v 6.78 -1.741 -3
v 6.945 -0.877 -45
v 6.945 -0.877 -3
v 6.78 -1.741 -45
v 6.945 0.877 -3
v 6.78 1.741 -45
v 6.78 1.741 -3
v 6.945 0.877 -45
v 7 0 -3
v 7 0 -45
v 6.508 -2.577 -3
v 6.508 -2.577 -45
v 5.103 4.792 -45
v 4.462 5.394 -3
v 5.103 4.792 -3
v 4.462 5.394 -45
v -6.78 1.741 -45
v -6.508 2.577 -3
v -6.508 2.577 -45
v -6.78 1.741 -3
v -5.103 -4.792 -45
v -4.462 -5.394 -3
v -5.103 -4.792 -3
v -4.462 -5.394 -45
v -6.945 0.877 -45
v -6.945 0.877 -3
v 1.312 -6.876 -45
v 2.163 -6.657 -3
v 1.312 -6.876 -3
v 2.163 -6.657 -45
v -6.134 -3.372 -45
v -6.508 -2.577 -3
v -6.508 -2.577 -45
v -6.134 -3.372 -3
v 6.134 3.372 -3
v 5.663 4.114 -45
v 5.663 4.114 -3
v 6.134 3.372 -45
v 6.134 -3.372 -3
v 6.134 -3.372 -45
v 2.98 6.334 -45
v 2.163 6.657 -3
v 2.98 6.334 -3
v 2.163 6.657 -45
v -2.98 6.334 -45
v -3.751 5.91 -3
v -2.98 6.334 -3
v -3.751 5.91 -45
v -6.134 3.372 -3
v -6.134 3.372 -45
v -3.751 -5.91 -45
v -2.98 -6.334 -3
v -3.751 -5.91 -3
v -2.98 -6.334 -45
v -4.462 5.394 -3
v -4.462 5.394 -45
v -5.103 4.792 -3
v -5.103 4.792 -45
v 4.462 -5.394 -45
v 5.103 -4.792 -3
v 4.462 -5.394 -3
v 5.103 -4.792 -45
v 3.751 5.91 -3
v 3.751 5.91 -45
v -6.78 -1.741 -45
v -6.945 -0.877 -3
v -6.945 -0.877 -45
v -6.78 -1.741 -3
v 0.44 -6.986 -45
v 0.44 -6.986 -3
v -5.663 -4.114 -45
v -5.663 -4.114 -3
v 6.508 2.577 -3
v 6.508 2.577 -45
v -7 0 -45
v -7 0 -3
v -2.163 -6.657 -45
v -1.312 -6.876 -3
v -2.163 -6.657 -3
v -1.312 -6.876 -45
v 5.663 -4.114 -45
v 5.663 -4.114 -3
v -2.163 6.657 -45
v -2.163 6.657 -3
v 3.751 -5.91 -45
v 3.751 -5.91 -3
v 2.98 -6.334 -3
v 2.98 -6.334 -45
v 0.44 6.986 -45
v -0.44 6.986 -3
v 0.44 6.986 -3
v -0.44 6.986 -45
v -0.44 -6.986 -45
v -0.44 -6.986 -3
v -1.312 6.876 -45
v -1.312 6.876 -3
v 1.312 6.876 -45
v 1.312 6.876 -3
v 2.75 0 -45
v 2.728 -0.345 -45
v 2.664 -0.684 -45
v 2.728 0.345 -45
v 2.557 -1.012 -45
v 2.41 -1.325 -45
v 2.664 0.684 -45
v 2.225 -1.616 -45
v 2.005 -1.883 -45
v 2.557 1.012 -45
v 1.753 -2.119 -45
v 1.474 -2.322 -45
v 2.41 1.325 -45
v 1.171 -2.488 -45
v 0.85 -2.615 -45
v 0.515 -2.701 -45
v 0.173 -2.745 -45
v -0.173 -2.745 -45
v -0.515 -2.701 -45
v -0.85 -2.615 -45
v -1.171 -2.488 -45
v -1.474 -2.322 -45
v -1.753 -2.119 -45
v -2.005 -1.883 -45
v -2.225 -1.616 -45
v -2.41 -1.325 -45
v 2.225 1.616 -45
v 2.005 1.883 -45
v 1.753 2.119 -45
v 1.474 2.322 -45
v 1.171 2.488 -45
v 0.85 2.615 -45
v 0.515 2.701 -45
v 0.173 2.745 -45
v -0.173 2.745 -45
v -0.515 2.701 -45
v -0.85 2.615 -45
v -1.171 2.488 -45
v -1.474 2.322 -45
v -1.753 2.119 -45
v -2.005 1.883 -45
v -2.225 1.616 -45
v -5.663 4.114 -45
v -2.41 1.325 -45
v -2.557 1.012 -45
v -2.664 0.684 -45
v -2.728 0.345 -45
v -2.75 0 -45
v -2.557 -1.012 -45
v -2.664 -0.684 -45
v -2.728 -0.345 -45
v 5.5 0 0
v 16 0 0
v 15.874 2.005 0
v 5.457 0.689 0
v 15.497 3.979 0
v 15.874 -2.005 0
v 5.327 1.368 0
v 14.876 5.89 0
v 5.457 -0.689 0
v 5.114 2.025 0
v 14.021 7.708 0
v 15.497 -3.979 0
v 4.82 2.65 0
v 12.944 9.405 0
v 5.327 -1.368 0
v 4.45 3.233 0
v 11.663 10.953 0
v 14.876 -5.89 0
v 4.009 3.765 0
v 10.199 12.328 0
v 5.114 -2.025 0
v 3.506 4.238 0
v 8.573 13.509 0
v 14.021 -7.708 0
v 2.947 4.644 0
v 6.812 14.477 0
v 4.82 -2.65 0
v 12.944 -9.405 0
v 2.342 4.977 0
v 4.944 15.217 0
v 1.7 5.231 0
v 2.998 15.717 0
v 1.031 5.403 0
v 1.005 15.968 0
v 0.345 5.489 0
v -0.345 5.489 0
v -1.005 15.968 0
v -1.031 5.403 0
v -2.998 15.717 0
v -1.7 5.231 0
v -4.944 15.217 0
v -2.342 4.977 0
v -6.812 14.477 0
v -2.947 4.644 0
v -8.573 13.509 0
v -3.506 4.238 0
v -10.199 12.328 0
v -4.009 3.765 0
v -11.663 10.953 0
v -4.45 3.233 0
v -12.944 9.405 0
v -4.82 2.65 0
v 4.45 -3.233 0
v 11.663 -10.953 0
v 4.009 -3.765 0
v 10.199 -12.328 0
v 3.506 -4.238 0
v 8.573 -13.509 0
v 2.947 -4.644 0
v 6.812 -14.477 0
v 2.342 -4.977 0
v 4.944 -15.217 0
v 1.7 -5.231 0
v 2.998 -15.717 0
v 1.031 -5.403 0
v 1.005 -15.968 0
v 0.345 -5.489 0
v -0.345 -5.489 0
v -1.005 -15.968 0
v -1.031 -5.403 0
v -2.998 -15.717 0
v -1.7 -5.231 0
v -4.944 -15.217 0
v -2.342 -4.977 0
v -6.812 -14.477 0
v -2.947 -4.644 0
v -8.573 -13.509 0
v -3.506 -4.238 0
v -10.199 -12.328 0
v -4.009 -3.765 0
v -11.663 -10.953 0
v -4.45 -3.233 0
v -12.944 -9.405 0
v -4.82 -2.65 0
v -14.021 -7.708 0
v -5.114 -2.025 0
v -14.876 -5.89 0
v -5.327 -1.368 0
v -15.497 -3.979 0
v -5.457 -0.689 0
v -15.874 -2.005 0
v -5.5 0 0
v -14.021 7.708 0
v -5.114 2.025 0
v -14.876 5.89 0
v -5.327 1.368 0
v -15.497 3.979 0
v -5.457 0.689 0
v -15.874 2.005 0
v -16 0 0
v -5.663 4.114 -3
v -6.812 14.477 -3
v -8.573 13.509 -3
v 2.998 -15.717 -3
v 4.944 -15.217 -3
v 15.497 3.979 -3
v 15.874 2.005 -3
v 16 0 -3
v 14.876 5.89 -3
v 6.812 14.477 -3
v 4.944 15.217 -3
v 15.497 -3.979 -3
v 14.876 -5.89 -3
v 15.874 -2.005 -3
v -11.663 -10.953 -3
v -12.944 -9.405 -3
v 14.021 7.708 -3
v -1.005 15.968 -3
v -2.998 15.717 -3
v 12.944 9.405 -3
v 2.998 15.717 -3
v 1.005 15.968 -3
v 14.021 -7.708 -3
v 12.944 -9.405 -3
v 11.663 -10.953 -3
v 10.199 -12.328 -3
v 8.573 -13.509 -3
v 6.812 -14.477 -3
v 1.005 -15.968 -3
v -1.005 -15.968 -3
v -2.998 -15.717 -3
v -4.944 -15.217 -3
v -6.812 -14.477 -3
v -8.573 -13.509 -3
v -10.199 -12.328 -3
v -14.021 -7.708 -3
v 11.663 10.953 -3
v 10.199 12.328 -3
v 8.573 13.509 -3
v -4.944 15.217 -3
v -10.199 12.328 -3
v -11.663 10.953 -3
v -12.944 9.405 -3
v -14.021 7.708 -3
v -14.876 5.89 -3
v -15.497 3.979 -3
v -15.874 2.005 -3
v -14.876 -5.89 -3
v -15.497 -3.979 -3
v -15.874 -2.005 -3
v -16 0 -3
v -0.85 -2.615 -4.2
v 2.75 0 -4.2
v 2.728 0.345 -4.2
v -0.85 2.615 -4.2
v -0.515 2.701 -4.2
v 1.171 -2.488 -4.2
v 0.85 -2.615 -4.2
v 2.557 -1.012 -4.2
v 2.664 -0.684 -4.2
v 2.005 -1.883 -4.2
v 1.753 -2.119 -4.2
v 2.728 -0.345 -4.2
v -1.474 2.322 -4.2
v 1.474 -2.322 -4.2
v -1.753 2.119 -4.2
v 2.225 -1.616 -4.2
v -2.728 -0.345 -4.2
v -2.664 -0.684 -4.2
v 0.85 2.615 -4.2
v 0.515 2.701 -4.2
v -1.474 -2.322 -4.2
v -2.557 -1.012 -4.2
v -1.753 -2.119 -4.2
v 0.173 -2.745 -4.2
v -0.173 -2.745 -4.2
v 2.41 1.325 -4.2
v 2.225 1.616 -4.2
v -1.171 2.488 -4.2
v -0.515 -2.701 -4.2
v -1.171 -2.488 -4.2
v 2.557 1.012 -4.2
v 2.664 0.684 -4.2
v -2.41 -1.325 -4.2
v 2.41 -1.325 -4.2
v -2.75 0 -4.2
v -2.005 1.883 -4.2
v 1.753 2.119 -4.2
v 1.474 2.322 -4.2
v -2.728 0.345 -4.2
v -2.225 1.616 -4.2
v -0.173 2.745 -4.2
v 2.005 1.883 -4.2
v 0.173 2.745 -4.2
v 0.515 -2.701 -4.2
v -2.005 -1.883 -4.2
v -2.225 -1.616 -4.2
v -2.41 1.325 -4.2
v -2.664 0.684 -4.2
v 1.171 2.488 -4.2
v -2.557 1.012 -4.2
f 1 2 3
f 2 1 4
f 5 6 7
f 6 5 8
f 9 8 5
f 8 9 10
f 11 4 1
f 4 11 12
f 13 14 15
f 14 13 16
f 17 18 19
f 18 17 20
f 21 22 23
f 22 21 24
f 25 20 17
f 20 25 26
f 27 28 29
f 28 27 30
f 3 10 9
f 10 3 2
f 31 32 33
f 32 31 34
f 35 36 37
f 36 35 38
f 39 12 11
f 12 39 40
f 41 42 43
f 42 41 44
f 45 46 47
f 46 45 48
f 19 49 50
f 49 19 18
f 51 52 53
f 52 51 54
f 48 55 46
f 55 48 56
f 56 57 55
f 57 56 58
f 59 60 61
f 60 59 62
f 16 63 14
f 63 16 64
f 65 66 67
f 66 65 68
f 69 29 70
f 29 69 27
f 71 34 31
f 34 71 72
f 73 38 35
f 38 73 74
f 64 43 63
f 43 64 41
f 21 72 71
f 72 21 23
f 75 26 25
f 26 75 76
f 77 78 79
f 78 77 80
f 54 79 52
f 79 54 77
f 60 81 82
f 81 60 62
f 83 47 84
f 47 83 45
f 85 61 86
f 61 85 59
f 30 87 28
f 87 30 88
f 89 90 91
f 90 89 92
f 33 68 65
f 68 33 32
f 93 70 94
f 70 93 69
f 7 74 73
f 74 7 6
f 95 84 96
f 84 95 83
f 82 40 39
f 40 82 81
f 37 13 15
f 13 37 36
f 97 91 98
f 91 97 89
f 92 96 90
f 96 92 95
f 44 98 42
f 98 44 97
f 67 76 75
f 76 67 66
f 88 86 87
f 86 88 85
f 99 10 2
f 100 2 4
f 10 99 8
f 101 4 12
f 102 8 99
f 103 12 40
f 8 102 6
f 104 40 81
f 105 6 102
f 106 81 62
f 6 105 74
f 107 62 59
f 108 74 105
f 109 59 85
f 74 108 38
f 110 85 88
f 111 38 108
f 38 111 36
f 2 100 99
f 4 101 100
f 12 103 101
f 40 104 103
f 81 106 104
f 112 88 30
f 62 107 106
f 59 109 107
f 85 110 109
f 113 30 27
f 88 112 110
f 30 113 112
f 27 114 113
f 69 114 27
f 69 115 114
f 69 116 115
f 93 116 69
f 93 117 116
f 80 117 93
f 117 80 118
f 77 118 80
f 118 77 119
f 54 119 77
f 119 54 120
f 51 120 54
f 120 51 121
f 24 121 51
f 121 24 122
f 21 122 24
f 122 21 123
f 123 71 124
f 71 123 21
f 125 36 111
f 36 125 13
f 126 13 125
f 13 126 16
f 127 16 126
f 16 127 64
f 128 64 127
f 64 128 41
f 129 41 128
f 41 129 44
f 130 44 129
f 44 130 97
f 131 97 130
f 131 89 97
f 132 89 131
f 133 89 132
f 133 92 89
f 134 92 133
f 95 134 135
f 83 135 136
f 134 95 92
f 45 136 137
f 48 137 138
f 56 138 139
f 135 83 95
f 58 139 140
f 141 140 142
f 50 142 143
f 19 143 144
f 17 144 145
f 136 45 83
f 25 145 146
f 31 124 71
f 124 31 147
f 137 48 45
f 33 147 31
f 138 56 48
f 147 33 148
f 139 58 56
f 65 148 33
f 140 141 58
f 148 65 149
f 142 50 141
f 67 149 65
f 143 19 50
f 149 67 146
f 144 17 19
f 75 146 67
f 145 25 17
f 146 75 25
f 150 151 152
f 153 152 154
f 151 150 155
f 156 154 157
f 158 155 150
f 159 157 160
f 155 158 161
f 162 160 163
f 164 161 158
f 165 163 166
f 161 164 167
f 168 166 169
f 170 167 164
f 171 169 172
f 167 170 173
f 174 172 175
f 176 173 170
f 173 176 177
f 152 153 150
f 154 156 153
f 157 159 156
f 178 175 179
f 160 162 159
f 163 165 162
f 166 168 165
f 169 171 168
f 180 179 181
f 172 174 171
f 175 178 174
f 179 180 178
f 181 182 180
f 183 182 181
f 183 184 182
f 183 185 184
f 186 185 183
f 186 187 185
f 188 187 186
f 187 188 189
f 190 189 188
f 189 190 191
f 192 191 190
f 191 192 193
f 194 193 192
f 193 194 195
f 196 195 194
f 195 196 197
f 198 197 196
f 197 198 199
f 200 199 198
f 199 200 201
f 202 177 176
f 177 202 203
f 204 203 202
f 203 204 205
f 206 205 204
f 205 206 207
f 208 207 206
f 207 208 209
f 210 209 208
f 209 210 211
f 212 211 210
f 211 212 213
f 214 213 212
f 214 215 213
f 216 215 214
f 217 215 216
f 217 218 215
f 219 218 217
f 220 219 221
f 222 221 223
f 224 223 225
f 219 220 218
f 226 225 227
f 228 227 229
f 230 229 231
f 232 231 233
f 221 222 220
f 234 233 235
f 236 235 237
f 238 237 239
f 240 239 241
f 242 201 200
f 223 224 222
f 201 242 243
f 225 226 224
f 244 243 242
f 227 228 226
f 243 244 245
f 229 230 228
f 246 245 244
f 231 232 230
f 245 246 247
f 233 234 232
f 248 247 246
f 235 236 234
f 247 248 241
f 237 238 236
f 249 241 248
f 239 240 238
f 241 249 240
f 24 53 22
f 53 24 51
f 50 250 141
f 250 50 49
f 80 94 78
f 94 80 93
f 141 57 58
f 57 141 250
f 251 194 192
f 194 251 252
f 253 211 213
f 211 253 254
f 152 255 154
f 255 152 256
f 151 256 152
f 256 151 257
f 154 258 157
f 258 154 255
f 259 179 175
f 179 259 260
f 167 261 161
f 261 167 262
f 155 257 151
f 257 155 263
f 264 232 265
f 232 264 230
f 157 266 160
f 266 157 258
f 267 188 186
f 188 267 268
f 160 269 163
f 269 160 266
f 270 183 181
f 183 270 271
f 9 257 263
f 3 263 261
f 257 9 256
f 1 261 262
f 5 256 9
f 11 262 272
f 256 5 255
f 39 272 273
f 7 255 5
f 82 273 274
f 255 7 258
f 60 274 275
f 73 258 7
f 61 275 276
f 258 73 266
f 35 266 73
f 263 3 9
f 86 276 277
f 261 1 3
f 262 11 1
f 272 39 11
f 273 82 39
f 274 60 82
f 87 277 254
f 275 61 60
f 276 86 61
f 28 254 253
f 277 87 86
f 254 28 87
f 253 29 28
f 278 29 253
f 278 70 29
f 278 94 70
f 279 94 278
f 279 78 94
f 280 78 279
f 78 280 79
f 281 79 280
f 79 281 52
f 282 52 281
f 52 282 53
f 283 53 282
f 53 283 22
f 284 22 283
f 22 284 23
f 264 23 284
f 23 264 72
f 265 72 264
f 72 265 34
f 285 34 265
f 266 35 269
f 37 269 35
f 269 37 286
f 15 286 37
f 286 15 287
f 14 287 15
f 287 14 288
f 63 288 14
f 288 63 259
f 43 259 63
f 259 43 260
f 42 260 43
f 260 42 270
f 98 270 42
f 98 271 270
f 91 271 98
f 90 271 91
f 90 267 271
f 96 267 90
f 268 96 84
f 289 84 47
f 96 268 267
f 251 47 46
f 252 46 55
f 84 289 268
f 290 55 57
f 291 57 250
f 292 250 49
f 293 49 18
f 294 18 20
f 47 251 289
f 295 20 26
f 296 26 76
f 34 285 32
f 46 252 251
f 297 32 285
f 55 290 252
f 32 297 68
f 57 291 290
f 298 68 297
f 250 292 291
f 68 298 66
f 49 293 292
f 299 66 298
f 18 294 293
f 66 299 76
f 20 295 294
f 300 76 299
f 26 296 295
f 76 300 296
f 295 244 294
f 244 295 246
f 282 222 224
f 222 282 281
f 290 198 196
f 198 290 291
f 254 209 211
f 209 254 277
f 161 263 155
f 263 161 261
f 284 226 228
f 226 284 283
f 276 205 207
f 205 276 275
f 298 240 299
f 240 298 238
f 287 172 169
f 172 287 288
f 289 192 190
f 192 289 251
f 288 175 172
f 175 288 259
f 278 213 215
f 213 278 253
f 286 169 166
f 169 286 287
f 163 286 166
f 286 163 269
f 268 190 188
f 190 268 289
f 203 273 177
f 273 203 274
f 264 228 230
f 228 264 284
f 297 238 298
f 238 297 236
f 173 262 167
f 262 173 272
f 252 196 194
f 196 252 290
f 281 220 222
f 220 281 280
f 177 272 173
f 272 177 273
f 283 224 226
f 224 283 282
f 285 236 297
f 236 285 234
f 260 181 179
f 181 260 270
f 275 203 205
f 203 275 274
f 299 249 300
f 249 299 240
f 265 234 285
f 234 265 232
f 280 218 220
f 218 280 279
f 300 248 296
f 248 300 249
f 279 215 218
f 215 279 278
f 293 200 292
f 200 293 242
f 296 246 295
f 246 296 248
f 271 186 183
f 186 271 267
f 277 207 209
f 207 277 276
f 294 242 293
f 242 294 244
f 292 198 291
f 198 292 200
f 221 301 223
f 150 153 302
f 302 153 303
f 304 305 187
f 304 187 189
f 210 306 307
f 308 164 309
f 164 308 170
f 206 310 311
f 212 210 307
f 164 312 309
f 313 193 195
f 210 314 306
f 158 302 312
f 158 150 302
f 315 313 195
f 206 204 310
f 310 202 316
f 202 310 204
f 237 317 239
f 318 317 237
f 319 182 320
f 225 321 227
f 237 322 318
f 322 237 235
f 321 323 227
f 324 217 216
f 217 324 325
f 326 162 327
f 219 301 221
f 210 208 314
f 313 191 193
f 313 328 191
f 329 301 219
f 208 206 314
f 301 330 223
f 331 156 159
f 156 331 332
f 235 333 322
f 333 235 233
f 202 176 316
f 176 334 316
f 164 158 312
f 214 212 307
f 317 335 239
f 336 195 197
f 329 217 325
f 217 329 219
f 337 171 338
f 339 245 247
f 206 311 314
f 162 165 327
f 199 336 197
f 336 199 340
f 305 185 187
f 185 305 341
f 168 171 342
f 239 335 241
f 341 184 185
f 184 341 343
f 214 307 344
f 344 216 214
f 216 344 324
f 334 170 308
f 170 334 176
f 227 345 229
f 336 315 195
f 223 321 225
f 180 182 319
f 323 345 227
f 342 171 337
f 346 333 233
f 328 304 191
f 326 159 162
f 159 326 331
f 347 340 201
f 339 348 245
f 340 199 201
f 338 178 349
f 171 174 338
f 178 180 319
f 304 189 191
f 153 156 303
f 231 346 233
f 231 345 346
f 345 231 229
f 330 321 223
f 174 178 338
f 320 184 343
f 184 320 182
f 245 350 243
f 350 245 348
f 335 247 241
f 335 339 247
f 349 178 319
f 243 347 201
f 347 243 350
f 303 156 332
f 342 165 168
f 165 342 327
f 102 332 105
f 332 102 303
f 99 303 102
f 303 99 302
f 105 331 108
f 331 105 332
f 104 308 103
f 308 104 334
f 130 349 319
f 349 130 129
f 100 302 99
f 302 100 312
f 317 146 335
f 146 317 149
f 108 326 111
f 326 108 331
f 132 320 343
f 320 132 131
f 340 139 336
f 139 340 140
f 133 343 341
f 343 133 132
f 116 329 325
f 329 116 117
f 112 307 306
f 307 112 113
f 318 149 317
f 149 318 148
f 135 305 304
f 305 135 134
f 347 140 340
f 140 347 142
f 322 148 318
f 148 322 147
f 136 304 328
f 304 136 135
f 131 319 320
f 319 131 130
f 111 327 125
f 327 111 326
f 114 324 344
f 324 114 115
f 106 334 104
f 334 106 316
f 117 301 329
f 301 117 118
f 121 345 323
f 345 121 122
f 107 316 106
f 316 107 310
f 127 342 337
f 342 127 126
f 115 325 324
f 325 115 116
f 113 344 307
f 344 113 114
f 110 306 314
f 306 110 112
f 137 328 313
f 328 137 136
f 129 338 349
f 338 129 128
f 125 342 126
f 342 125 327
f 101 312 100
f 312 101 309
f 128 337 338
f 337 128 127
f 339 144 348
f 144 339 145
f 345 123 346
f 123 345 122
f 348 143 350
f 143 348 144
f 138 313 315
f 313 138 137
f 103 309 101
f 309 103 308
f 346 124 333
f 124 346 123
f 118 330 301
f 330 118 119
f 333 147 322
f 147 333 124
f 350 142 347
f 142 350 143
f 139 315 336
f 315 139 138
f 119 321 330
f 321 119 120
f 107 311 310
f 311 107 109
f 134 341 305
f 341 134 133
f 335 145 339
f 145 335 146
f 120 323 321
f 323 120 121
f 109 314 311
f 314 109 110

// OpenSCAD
$fn = 50;


difference() {
	union() {
		translate(v = [0, 0, -45.0000000000]) {
			cylinder(h = 45, r = 7.0000000000);
		}
		translate(v = [0, 0, -3.0000000000]) {
			cylinder(h = 3, r = 16.0000000000);
		}
	}
	union() {
		translate(v = [0, 0, 0]) {
			rotate(a = [0, 0, 0]) {
				difference() {
					union() {
						#translate(v = [0, 0, -45.0000000000]) {
							cylinder(h = 45, r = 2.2500000000);
						}
						#translate(v = [0, 0, -4.2000000000]) {
							cylinder(h = 4.2000000000, r1 = 2.7500000000, r2 = 5.5000000000);
						}
						#translate(v = [0, 0, -45.0000000000]) {
							cylinder(h = 45, r = 2.7500000000);
						}
						#translate(v = [0, 0, -45.0000000000]) {
							cylinder(h = 45, r = 2.2500000000);
						}
					}
					union();
				}
			}
		}
	}
}
